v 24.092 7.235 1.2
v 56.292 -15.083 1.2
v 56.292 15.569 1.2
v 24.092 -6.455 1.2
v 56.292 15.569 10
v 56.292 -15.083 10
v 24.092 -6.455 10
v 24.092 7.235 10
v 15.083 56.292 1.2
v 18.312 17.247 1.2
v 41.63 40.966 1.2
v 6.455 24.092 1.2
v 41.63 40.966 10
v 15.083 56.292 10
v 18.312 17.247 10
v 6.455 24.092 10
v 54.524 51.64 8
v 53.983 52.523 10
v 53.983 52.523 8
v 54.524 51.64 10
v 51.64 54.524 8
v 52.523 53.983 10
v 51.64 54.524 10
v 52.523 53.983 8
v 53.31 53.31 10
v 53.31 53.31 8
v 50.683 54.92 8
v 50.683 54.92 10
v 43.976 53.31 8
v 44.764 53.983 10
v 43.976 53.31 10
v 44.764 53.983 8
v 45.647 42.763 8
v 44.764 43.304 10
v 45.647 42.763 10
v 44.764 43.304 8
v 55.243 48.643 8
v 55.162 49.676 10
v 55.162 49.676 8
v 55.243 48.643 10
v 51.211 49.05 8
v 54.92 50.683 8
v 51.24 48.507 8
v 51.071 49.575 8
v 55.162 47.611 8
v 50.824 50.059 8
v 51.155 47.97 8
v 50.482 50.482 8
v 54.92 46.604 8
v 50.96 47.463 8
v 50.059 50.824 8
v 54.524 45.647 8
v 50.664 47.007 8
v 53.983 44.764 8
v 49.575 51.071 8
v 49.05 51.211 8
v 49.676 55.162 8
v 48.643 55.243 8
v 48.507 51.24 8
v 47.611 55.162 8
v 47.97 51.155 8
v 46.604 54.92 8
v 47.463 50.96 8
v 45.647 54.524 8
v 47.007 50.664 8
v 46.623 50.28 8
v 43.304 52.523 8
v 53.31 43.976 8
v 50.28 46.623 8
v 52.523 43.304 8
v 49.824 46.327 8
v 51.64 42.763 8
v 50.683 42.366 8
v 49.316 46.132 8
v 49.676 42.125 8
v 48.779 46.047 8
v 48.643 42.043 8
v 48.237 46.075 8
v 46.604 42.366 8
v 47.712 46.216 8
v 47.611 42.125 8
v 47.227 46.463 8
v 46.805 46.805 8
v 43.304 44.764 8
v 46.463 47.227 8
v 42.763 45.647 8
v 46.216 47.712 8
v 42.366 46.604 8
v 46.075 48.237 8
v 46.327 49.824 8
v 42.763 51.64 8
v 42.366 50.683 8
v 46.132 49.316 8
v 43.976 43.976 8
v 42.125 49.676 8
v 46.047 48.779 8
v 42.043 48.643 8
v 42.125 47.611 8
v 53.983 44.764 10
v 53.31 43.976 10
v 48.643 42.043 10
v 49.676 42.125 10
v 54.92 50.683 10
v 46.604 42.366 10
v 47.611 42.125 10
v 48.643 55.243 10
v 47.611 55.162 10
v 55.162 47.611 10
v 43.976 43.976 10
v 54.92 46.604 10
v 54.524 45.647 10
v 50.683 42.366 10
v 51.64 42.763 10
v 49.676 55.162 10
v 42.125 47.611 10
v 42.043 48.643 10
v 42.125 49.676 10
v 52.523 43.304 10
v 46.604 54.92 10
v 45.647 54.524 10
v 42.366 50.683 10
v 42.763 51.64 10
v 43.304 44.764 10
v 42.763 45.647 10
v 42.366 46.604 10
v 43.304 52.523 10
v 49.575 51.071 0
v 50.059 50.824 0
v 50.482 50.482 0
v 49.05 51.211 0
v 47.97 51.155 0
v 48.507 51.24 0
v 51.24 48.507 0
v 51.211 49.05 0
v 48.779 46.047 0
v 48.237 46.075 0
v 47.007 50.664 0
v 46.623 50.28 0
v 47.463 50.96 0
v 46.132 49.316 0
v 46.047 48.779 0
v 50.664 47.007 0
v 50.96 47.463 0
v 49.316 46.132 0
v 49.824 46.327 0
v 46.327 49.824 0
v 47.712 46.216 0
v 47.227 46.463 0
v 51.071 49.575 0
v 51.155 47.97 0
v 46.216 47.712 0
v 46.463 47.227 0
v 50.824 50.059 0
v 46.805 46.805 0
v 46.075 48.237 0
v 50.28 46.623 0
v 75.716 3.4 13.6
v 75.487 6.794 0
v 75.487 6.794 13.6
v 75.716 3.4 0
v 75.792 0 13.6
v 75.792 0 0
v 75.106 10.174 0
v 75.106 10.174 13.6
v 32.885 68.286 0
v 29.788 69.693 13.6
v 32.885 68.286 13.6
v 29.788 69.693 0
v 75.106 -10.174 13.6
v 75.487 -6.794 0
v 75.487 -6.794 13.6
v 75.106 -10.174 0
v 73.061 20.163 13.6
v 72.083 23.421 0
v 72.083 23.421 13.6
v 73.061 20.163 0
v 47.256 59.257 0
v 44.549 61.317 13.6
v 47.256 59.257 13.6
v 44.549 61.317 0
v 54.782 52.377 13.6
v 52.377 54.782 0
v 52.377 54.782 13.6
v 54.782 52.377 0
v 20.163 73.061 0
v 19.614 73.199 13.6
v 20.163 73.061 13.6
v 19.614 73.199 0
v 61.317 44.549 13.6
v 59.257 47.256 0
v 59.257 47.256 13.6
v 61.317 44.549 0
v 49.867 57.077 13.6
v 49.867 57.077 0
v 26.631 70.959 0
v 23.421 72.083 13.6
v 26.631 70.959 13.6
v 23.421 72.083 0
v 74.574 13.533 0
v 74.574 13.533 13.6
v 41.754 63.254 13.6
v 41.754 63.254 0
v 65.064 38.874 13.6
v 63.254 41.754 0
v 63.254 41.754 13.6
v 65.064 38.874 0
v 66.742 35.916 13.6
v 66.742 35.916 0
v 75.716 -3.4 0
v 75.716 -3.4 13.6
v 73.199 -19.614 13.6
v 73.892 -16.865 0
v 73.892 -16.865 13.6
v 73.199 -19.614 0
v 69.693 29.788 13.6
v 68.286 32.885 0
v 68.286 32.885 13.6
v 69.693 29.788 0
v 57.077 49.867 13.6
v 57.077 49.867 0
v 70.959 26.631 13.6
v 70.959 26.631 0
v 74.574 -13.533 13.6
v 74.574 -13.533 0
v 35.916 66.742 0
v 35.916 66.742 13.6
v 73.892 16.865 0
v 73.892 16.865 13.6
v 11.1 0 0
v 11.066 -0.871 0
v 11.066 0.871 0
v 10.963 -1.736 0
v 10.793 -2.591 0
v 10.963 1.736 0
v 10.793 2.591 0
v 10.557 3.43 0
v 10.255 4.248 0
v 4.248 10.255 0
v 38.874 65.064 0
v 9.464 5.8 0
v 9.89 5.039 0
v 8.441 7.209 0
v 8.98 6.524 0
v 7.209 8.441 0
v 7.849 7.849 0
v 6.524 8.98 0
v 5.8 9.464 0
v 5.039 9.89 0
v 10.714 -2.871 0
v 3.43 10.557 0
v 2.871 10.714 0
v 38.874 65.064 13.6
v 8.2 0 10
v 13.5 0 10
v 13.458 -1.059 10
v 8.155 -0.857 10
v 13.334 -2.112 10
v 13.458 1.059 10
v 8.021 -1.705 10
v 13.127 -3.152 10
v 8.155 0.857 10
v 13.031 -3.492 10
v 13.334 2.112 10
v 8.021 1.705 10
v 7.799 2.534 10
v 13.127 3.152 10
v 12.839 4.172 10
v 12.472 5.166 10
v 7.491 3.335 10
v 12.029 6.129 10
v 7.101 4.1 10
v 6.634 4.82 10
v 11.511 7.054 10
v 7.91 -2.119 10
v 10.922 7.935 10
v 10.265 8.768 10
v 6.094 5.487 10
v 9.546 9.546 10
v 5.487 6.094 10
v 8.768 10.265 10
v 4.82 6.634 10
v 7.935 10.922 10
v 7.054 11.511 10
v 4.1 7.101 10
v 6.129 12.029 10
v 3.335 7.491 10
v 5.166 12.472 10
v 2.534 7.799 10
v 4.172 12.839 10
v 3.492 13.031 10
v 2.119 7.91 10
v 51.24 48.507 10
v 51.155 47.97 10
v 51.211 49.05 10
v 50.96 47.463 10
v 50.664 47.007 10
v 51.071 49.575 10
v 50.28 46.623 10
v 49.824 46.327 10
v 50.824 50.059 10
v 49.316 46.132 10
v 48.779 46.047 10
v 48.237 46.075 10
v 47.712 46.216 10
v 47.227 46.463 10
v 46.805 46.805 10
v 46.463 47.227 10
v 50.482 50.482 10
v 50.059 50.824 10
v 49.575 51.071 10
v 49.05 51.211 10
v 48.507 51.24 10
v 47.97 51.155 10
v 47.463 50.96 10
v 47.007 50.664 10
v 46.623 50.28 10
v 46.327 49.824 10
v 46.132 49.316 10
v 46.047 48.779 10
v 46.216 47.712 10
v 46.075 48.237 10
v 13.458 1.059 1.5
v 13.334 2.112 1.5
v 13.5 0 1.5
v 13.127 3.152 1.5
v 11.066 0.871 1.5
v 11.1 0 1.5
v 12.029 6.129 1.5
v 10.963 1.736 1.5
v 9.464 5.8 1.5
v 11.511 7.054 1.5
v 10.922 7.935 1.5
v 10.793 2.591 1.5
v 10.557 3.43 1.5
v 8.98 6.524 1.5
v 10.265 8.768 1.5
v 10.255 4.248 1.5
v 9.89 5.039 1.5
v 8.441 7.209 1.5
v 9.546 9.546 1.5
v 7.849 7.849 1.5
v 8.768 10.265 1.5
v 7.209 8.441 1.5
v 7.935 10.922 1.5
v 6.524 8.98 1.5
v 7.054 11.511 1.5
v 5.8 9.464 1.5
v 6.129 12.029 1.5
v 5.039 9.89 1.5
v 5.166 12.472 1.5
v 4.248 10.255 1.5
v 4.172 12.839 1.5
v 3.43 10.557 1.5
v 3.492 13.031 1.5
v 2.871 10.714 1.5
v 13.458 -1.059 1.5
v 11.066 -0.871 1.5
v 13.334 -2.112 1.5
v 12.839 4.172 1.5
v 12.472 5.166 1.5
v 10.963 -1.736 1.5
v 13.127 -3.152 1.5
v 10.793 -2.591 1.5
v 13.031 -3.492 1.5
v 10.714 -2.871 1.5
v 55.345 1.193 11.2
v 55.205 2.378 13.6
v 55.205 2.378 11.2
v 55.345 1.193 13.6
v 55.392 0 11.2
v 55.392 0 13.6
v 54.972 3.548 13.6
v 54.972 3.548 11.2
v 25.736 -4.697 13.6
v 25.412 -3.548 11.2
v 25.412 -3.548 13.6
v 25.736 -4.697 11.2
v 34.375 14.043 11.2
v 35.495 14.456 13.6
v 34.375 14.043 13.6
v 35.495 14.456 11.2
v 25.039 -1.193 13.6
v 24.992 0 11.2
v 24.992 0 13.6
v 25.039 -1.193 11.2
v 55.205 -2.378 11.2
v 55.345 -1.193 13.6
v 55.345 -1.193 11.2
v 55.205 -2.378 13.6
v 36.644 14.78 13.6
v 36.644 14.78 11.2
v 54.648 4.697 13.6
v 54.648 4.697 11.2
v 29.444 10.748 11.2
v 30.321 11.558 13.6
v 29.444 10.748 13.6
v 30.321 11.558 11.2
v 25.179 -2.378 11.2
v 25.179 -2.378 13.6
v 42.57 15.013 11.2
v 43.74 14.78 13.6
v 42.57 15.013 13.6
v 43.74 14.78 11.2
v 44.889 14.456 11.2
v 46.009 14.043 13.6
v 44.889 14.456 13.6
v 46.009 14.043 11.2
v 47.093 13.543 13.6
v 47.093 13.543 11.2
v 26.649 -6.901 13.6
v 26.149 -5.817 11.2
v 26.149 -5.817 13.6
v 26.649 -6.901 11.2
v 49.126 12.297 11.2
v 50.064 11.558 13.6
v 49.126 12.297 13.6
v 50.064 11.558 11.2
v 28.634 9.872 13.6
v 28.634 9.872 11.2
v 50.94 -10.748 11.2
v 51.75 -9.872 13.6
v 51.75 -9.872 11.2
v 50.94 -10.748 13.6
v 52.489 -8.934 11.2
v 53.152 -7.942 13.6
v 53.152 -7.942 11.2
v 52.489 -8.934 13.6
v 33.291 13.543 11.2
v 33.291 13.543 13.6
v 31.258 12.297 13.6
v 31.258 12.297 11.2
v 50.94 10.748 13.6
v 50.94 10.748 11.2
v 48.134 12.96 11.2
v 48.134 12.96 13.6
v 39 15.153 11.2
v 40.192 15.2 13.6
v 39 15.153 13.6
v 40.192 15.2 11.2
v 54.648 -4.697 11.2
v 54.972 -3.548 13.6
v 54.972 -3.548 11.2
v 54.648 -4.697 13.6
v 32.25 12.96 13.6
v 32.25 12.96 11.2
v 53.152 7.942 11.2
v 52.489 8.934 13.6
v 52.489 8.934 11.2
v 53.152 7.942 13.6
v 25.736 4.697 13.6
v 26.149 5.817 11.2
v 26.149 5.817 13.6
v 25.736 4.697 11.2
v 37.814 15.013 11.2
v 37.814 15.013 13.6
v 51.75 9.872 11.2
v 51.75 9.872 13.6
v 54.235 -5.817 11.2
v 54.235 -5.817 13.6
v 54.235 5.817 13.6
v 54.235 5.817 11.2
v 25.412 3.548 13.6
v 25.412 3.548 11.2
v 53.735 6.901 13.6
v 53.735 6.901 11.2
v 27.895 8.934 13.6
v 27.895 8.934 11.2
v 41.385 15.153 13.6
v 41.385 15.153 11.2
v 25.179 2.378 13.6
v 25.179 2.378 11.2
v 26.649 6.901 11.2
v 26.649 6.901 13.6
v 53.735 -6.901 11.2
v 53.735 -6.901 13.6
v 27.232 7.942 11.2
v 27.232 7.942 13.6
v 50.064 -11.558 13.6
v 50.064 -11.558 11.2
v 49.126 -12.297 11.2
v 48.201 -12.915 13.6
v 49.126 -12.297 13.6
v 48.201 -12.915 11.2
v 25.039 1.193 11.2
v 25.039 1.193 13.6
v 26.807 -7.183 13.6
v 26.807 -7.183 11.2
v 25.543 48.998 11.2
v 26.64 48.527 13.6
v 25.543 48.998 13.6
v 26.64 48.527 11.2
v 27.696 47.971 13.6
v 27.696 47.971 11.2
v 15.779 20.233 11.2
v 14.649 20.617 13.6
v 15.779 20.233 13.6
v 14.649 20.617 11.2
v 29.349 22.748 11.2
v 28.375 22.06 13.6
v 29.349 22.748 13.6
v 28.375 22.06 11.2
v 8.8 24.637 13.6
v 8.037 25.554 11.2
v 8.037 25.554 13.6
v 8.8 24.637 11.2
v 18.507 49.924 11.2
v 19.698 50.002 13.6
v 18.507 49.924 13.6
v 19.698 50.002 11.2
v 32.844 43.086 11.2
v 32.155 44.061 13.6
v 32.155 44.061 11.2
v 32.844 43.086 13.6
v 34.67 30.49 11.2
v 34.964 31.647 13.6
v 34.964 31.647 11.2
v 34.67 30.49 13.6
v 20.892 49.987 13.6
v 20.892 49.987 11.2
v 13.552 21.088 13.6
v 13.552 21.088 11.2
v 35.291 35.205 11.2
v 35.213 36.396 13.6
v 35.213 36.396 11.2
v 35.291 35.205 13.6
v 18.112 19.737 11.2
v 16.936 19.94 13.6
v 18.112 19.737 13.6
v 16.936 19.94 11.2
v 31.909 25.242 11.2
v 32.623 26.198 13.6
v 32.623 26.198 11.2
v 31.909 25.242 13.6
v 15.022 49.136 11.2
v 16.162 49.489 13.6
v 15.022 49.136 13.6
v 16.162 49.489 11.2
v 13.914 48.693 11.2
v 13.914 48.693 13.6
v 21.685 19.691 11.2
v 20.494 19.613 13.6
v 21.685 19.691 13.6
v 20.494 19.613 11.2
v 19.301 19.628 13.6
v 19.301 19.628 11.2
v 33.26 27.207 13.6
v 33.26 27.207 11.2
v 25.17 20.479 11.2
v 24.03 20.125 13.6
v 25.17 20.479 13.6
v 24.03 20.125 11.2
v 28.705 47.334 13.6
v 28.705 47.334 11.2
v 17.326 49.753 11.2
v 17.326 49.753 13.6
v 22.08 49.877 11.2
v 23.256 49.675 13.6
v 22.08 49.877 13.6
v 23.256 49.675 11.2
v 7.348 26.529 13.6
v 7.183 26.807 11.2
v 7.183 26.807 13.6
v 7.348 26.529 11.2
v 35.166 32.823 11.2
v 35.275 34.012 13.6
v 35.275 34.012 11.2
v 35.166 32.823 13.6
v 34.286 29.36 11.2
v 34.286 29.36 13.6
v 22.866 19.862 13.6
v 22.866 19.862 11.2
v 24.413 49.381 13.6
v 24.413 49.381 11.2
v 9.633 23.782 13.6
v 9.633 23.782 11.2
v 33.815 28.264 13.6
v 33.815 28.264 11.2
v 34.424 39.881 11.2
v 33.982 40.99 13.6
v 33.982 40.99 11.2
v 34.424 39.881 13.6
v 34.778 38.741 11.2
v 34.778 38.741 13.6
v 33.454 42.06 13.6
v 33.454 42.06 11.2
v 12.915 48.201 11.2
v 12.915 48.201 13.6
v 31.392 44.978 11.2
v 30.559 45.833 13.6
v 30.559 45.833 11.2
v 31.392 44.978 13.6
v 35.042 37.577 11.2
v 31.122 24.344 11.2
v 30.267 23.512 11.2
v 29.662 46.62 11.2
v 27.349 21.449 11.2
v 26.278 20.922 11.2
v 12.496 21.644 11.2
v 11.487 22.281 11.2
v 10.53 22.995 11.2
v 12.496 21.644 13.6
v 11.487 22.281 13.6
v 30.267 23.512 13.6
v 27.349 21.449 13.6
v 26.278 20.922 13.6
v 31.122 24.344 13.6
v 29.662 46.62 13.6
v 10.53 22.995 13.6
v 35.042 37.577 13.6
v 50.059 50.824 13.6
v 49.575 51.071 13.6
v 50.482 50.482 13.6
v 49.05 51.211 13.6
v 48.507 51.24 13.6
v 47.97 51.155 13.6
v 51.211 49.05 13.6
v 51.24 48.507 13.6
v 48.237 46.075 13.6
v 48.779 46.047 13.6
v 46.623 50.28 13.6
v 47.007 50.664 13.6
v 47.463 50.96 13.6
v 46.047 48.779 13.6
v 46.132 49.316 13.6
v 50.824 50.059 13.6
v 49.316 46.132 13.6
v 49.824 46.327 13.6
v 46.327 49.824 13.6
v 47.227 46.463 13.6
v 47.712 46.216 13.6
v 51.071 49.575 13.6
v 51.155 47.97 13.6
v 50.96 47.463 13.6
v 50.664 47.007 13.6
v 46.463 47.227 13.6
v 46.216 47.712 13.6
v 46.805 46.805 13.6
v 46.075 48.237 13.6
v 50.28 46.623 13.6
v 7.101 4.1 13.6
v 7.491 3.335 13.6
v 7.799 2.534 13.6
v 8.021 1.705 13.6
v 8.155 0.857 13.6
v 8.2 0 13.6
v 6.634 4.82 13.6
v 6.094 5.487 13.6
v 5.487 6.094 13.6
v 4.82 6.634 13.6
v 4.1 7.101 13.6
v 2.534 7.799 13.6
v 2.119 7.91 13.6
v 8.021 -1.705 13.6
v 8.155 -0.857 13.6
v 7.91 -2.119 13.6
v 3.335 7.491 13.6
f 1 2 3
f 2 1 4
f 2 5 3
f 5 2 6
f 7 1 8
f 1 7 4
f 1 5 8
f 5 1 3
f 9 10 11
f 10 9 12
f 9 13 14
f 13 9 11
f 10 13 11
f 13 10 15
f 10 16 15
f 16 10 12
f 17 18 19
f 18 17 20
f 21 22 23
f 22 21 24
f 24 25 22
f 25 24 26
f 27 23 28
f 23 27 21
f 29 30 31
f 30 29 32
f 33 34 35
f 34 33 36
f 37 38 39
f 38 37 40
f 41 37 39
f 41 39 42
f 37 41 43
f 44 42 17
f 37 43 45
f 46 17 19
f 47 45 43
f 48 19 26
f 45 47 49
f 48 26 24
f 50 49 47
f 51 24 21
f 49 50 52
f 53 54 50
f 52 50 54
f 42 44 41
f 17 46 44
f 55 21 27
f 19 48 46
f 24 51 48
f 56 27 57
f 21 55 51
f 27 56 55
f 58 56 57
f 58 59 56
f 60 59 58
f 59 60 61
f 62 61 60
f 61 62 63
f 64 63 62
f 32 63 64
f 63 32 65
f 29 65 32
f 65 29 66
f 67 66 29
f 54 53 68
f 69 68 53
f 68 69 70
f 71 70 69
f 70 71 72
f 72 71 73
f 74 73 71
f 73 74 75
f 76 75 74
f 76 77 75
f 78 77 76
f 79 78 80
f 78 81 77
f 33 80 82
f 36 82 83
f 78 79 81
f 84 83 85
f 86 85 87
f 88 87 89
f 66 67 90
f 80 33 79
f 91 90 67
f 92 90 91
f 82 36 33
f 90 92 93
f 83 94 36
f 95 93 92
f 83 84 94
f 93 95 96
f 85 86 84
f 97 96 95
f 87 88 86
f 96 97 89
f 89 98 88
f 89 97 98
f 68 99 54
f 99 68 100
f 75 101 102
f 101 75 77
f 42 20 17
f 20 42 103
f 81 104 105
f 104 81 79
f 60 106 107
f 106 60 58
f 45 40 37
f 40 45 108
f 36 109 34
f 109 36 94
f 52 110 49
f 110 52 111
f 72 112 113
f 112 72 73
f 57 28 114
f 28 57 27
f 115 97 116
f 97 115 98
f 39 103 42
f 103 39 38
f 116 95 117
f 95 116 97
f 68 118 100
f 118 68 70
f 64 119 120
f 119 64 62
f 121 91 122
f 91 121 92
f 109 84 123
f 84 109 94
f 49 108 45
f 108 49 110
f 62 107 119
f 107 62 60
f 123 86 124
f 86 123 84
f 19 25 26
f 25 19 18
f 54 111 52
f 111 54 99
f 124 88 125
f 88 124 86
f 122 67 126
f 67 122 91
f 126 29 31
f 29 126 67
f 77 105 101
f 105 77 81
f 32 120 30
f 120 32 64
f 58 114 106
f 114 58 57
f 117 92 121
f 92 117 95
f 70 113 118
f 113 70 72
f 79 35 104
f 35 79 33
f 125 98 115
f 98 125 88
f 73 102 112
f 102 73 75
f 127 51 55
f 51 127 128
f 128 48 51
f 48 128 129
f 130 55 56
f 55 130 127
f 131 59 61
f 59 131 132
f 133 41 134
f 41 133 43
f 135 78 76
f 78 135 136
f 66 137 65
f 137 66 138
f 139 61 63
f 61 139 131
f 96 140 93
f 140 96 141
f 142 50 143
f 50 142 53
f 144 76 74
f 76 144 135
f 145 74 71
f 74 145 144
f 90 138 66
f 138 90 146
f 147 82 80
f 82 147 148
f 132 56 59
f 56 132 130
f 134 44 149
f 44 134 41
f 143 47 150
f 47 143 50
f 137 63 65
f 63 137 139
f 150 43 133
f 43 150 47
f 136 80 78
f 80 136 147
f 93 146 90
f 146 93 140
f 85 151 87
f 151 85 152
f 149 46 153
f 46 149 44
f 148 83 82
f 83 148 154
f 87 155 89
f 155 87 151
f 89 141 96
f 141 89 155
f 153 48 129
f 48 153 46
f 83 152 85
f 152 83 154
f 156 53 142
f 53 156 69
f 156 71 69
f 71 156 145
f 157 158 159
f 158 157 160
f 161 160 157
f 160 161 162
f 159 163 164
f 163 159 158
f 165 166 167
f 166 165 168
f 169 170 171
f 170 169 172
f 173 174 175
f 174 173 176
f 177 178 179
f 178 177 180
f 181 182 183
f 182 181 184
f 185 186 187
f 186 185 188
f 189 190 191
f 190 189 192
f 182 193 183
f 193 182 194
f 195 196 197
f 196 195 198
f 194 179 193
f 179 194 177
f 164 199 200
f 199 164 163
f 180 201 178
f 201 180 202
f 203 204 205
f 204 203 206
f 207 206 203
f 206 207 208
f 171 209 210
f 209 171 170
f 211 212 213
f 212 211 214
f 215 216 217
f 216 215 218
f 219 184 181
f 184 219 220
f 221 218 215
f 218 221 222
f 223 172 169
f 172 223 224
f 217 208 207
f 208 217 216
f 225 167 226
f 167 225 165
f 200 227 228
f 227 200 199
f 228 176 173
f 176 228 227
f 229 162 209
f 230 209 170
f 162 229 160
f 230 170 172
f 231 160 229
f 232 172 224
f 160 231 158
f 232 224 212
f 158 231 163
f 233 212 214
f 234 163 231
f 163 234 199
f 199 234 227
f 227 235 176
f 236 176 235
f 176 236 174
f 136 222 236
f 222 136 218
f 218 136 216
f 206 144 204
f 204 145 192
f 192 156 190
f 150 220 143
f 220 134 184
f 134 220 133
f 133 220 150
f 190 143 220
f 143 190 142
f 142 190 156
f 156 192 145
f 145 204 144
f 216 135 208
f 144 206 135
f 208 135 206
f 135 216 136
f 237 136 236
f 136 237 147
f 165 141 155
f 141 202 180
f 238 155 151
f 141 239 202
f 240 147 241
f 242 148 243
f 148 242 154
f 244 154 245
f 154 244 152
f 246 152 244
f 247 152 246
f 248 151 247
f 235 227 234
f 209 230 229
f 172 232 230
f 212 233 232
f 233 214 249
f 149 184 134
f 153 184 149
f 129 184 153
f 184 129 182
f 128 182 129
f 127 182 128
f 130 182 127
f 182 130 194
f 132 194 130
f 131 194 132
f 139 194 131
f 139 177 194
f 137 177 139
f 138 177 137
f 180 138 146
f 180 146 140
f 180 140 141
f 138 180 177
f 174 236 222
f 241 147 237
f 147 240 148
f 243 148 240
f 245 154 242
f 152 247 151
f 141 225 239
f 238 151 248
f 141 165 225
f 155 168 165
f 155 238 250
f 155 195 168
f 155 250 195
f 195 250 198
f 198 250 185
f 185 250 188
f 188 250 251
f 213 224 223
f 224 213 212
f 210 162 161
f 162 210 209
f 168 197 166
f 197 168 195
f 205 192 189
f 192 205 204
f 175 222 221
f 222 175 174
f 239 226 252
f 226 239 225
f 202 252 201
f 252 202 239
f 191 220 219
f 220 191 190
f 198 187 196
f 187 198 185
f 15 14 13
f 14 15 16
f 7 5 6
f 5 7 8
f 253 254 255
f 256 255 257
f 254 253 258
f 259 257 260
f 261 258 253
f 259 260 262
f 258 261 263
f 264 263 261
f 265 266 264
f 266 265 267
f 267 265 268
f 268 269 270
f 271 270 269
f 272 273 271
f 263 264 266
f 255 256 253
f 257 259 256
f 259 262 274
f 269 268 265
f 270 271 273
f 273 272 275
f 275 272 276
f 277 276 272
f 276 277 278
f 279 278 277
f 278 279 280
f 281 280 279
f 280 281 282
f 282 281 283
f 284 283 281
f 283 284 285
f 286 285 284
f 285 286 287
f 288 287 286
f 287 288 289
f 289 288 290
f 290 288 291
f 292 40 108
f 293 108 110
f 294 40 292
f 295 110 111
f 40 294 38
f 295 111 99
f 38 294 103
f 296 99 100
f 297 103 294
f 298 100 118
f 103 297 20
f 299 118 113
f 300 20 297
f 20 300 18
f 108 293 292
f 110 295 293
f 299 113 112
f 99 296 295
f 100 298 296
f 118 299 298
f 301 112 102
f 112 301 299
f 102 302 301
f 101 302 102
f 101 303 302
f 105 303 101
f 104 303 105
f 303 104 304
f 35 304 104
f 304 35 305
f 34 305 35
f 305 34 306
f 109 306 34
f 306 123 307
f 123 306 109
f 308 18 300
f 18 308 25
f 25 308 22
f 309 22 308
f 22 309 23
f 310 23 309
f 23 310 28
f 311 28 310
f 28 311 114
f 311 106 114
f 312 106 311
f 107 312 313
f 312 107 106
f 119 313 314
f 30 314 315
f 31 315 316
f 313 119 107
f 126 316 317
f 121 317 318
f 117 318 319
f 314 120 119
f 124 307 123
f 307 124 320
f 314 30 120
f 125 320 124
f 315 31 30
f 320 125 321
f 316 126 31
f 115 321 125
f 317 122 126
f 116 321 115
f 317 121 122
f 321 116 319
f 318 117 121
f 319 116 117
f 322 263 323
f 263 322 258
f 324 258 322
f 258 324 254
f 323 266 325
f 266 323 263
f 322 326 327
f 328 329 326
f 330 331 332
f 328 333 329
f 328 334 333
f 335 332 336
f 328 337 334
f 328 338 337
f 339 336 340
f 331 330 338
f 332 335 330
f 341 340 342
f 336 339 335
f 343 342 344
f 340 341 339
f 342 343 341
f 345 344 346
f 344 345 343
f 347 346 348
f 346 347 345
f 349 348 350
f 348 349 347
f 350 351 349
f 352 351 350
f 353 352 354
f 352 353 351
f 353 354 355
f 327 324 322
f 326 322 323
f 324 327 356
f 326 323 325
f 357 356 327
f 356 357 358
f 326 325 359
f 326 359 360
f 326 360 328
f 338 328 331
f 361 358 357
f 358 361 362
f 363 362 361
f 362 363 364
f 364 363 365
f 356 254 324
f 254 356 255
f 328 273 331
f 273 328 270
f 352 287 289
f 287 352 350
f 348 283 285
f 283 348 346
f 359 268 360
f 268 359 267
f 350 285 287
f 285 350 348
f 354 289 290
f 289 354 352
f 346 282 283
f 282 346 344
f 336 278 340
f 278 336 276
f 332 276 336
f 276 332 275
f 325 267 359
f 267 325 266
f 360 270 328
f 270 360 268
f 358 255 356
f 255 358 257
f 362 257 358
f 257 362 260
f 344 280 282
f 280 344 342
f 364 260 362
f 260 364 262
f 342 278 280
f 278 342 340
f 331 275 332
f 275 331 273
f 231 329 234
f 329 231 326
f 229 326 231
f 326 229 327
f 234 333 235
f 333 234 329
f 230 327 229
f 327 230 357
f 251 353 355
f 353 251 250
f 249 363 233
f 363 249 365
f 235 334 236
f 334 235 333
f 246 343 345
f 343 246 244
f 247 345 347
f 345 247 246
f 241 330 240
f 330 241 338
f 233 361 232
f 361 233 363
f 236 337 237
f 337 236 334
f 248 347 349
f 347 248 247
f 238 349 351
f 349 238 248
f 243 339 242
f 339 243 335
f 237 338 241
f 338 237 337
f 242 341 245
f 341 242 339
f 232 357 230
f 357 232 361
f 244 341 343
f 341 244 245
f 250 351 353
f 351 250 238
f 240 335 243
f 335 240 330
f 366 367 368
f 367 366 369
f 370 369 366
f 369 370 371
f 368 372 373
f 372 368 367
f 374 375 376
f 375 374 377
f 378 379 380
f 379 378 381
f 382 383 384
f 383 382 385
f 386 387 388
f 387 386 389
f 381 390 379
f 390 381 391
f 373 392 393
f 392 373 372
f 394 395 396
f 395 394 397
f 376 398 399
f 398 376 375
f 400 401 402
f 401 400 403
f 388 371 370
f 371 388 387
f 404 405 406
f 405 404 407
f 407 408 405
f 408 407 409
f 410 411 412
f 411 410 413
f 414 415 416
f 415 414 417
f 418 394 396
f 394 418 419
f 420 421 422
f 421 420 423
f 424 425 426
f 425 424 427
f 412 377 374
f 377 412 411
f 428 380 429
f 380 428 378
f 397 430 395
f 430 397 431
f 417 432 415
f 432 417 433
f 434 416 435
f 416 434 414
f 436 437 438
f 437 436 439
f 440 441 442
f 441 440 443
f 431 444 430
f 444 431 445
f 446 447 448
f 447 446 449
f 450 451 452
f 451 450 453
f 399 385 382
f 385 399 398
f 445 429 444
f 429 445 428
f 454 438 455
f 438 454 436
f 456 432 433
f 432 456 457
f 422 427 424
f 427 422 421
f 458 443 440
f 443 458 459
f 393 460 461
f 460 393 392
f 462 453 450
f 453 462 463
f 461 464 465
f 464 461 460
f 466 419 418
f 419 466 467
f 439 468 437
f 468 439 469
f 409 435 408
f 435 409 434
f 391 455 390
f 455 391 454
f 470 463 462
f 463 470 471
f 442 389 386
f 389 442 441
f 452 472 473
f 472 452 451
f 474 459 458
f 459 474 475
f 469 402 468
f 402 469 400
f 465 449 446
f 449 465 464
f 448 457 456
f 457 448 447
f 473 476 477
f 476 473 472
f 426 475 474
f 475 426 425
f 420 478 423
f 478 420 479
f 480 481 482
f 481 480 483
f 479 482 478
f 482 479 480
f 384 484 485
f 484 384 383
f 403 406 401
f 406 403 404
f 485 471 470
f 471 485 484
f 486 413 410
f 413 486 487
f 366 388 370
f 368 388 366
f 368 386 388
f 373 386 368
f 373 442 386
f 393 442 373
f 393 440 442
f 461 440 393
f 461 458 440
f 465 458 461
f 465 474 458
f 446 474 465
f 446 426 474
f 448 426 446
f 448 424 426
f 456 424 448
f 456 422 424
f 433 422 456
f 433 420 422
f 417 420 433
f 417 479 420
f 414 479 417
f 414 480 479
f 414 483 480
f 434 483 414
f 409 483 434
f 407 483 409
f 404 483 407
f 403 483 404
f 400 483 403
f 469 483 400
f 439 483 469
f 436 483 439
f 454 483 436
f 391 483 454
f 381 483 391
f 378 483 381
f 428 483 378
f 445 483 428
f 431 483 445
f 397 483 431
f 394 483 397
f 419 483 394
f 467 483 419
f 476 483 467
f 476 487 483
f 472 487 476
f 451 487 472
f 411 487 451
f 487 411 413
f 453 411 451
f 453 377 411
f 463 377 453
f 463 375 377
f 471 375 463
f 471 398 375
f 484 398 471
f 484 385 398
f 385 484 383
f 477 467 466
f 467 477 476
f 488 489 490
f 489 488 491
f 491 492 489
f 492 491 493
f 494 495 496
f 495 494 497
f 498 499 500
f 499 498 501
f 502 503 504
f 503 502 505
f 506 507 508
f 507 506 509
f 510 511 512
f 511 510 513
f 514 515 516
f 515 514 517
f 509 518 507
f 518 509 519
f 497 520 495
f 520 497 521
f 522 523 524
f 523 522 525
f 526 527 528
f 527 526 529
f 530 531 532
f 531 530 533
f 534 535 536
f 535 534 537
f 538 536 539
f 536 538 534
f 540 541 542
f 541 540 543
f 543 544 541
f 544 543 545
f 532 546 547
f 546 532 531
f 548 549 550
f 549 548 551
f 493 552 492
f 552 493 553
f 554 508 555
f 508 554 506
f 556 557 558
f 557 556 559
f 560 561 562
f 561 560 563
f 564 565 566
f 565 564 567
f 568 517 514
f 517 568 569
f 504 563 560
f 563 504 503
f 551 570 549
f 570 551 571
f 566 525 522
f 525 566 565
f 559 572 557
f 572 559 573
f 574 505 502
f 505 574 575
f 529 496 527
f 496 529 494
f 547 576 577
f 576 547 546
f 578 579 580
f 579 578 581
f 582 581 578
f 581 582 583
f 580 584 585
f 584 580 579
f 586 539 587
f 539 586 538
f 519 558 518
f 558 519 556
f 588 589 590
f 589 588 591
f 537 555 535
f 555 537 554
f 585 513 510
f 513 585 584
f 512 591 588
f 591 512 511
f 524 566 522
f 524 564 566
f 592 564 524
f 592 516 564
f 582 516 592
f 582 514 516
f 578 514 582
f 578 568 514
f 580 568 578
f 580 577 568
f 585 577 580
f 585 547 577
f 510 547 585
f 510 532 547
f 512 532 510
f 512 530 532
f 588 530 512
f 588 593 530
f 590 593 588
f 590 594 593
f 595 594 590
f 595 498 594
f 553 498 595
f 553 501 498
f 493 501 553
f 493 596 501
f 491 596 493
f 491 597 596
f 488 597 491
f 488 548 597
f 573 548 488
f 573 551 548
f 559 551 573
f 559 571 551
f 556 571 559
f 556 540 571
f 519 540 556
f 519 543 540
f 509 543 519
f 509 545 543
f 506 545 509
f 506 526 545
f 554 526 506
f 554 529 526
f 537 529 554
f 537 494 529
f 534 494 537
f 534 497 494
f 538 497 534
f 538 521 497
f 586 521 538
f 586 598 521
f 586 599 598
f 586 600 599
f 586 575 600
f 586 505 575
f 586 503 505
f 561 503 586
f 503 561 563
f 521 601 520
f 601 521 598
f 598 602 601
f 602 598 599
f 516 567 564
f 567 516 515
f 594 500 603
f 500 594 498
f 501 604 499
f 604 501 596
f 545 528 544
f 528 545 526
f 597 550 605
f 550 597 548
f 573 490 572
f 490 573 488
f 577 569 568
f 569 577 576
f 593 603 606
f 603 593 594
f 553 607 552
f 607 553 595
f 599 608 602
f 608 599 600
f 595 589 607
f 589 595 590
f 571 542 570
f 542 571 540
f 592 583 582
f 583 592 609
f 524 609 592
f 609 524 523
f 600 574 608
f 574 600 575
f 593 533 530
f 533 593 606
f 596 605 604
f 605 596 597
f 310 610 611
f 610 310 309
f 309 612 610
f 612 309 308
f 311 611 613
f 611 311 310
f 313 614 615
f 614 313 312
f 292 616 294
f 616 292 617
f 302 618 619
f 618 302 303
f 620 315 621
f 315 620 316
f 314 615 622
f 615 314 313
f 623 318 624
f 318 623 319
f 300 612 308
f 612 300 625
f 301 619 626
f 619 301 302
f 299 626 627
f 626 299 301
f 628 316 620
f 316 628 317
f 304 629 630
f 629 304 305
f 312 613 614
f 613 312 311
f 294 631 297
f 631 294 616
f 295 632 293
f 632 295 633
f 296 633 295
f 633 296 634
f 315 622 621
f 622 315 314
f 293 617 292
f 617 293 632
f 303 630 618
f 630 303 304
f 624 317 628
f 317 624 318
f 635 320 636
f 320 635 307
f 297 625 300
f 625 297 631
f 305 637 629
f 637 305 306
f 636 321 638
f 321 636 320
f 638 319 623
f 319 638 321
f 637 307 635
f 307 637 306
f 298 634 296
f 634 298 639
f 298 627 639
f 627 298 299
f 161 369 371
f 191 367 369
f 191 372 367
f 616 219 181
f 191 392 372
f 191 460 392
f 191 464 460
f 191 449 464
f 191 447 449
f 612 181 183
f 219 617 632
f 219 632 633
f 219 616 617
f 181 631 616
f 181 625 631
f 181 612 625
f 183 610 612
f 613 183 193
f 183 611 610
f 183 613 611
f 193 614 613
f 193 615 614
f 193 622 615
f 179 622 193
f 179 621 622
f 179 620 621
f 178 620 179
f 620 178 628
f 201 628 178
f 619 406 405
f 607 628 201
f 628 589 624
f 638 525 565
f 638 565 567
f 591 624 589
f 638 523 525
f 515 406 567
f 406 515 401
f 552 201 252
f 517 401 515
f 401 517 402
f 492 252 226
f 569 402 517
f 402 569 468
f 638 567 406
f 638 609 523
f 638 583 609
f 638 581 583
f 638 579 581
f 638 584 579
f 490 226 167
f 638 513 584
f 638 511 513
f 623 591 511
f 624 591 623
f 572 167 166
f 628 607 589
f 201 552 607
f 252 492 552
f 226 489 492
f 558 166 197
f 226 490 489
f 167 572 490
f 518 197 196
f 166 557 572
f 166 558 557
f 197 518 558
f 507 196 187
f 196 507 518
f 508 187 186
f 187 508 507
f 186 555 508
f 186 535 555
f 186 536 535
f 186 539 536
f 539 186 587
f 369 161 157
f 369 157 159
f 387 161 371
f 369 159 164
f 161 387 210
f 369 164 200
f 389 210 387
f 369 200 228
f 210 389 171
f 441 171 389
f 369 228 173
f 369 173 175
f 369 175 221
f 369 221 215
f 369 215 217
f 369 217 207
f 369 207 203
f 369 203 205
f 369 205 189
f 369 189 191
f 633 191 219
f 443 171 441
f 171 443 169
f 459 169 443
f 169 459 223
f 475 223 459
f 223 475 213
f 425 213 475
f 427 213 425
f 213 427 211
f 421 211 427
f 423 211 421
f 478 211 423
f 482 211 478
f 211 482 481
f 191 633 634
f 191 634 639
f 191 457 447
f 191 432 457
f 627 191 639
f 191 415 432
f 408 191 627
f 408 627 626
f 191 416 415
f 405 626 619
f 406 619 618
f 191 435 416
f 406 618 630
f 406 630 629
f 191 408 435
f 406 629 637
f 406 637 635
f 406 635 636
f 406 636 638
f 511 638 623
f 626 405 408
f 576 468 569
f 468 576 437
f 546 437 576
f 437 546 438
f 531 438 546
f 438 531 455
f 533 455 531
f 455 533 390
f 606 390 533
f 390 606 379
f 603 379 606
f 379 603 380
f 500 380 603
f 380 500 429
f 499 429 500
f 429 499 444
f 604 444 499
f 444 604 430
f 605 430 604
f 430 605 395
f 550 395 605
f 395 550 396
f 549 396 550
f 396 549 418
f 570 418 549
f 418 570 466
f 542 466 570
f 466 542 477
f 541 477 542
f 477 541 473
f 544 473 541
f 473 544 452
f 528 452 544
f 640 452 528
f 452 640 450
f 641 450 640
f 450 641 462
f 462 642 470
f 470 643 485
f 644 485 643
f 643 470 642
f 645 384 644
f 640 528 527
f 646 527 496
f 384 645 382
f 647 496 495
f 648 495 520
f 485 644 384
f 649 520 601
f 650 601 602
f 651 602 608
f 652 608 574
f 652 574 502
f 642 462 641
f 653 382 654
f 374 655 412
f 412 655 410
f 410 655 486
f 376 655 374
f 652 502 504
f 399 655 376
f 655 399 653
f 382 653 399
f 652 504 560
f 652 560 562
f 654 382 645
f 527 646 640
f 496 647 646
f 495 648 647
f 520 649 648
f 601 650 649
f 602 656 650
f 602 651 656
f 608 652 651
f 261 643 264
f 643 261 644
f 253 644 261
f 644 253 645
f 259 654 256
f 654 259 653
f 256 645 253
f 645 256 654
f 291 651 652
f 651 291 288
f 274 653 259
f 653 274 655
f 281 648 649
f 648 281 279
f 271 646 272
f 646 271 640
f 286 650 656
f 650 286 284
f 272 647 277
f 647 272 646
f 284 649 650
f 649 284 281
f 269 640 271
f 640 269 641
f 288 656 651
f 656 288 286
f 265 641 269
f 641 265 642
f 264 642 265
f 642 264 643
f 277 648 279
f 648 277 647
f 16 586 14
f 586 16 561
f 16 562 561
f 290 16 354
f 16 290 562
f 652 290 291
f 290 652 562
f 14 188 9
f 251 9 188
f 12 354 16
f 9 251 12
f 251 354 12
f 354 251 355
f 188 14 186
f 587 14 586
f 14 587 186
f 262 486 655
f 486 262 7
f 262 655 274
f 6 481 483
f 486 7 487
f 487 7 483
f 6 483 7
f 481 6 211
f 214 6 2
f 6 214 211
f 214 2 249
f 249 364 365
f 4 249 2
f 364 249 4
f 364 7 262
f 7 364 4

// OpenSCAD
/* 
   GEN 11 v5.6: THE INTEGRATED TRIPLE-CHECK MASTER
   - COMPONENTS: Hex-Lock Rotor, Bearing-Ready Stators, Flux-Return Plates, Spacers, Winder.
   - VERIFICATION: Added "verify_alignment" mode to see Coil-to-Washer overlap.
   - LOCKING: Central 13.5mm Hex-Nut Trap for M8 Rod.
   - TOLERANCE: Unified magnet_center_r across all parts for modular alignment.
*/

// ==========================================
// 1. MASTER PARAMETERS (USER TUNABLES)
// ==========================================
num_magnets = 12;           
num_coils   = 6;            
bar_mag_length = 29.2;      
bar_mag_width  = 9.4;        
bar_mag_depth  = 6.0;        

// --- GAP & FLUX ---
air_gap = 1.25;             
coil_thickness = 7.8;       
thin_floor = 1.2;           
washer_flux_depth = 2.4;    
washer_flux_r = 15.2;       
flux_plate_floor = 1.2;     

// --- AXLE & BEARING (608 Standard) ---
axel_r = 4.2;               
nut_hex_dist = 13.5;        
bearing_od = 22.2;          
bearing_h = 7.1;            
alignment_bolt_r = 2.6;     
spacer_inset_depth = 2.0;   

// --- DYNAMIC CALCULATIONS ---
magnet_gap_buffer = 4.0;
min_circ = num_magnets * (bar_mag_width + magnet_gap_buffer);
magnet_center_r = (min_circ / (2 * PI)) + (bar_mag_length / 2);
rotor_total_h = 10.0;       
rotor_r = magnet_center_r + (bar_mag_length / 2) + 6;
stator_r = rotor_r + 15;    
mount_r = rotor_r + 8; 
stator_h = 10.0;            

// ==========================================
// 2. VIEW MODES (Choose One)
// ==========================================
show_print_layout   = false;
show_full_assembly  = false;
verify_alignment    = true; // Set to TRUE to see the "X-Ray" alignment check

if (verify_alignment) {
    check_flux_alignment();
} else if (show_full_assembly) {
    renderFullAssembly();
} else {
    // Standard Print Layout
    layout_gap = stator_r * 2.2;
    translate([0, 0, 0]) bar_rotor();
    translate([layout_gap, 0, 0]) bar_stator();
    translate([layout_gap * 1.5, layout_gap, 0]) flux_plate();
    translate([layout_gap, layout_gap * 0.8, 0]) spacer_set();
    translate([0, -layout_gap * 0.8, 0]) bar_winder_set();
}

// ==========================================
// 3. ASSEMBLY & VERIFICATION LOGIC
// ==========================================

module renderFullAssembly() {
    arm_dist = (rotor_total_h/2) + air_gap; 
    color("Silver") cylinder(h=120, r=axel_r, center=true, $fn=40);
    color("Gold", 0.8) bar_rotor();
    color("DimGray") {
        translate([0,0, rotor_total_h/2 - 2]) rotate([0,0,30]) m8_nut();
        translate([0,0, -rotor_total_h/2 + 2]) rotate([0,0,0]) m8_nut();
    }
    translate([0, 0, arm_dist + stator_h]) rotate([180, 0, 0]) {
        color("RoyalBlue", 0.5) bar_stator();
        translate([0,0,-0.5]) color("LightGrey") 608_bearing();
    }
    translate([0, 0, -arm_dist - stator_h]) rotate([0, 0, 0]) {
        color("RoyalBlue", 0.5) bar_stator();
        translate([0,0,-0.5]) color("LightGrey") 608_bearing();
    }
    flux_h = washer_flux_depth + flux_plate_floor;
    translate([0,0, arm_dist + stator_h]) color("CadetBlue", 0.6) flux_plate();
    translate([0,0, -arm_dist - stator_h - flux_h]) color("CadetBlue", 0.6) flux_plate();
    spacer_h = (rotor_total_h + (2 * air_gap)) + (2 * spacer_inset_depth);
    for(i=[0:3]) rotate([0,0,i*90+45]) translate([mount_r, 0, 0]) {
        translate([0,0, -spacer_h/2]) color("Orange") stator_spacer();
        color("Silver") cylinder(h=100, r=alignment_bolt_r, center=true, $fn=20);
    }
}

module check_flux_alignment() {
    // This "X-Rays" the side-profile of one coil/washer set
    intersection() {
        union() {
            color("RoyalBlue", 0.4) bar_stator();
            color("DimGray", 0.8) translate([0,0, stator_h]) flux_plate();
        }
        // Slice a 30-degree wedge
        rotate([0,0,-15]) cube([150, 150, 50]);
    }
}

// ==========================================
// 4. CORE COMPONENT MODULES
// ==========================================

module bar_rotor() {
    difference() {
        cylinder(h=rotor_total_h, r=rotor_r, center=true, $fn=120);
        for (i = [0:num_magnets-1]) {
            rotate([0, 0, i * (360/num_magnets)])
                translate([magnet_center_r, 0, 0]) 
                cube([bar_mag_length + 0.4, bar_mag_width + 0.4, 25], center=true);
        }
        cylinder(h=rotor_total_h + 2, r=nut_hex_dist/2 / cos(30), center=true, $fn=6);
    }
}

module bar_stator() {
    difference() {
        cylinder(h=stator_h, r=stator_r, $fn=140);
        for(i = [0 : num_coils - 1]) {
            rotate([0, 0, i * (360/num_coils)])
            translate([magnet_center_r, 0, thin_floor]) 
                trap_shape(h=20, extra_l=3, extra_w=2);
        }
        translate([0, 0, 1.5]) cylinder(h=stator_h, r=13.5, $fn=80); 
        translate([0, 0, -1]) cylinder(h=bearing_h + 1, r=bearing_od/2, $fn=80);
        translate([0,0,-1]) cylinder(h=20, r=axel_r + 0.5, $fn=60);
        for(i = [0:3]) {
            rotate([0, 0, i * 90 + 45]) translate([mount_r, 0, stator_h - spacer_inset_depth])
                cylinder(h=spacer_inset_depth + 1, r=6.6, $fn=40);
            rotate([0, 0, i * 90 + 45]) translate([mount_r, 0, -5]) 
                cylinder(h=stator_h + 15, r=alignment_bolt_r, $fn=30);
        }
    }
}

module flux_plate() {
    h_plate = washer_flux_depth + flux_plate_floor;
    difference() {
        cylinder(h=h_plate, r=stator_r, $fn=140);
        for(i = [0 : num_coils - 1]) {
            rotate([0, 0, i * (360/num_coils)])
            translate([magnet_center_r, 0, flux_plate_floor]) 
                cylinder(h=10, r=washer_flux_r, $fn=80);
        }
        for(i = [0:3]) {
            rotate([0, 0, i * 90 + 45]) translate([mount_r, 0, -1]) 
                cylinder(h=20, r=alignment_bolt_r, $fn=30);
        }
        translate([0,0,-1]) cylinder(h=20, r=axel_r + 4, $fn=60);
    }
}

module stator_spacer() {
    h_spacer = (rotor_total_h + (2 * air_gap)) + (2 * spacer_inset_depth);
    difference() {
        cylinder(h=h_spacer, r=6.5, $fn=50);
        translate([0,0,-1]) cylinder(h=h_spacer+2, r=alignment_bolt_r, $fn=30);
    }
}

// ==========================================
// 5. TOOLING & HELPERS
// ==========================================

module bar_winder_set() {
    spacing = bar_mag_length + 40;
    translate([-spacing/2, 0, 0]) winder_bottom();
    translate([spacing/2, 0, 0]) winder_top();
}

module winder_bottom() {
    f_h = 6.0; core_h = coil_thickness + 3.0; 
    difference() {
        union() {
            trap_shape(h=f_h, extra_l=10, extra_w=8); 
            translate([0,0, f_h]) trap_shape(h=core_h, extra_l=-0.5, extra_w=-1);
        }
        translate([0,0,-1]) cylinder(h=50, r=alignment_bolt_r, $fn=40);
        translate([0, 0, f_h/2]) cube([bar_mag_length*5, 1.4, f_h+0.2], center=true);
    }
}

module winder_top() {
    f_h = 6.0;
    difference() {
        trap_shape(h=f_h, extra_l=10, extra_w=8);
        translate([0, 0, f_h - 3.0]) scale([1.1, 1.1, 1]) trap_shape(h=4, extra_l=-0.5, extra_w=-1);
        translate([0,0,-1]) cylinder(h=50, r=alignment_bolt_r, $fn=40);
    }
}

module trap_shape(h, extra_l=0, extra_w=0) {
    pitch = 30; l = bar_mag_length + extra_l;
    r_in = magnet_center_r - l/2; r_out = magnet_center_r + l/2;
    wi = (2 * r_in * sin(pitch/2)) + extra_w;
    wo = (2 * r_out * sin(pitch/2)) + extra_w;
    translate([-l/2, 0, 0]) linear_extrude(h) polygon([[0, -wi/2], [0, wi/2], [l, wo / 2], [l, -wo / 2]]);
}

module m8_nut() {
    difference() {
        cylinder(h=6.5, r=nut_hex_dist/2 / cos(30), center=true, $fn=6);
        cylinder(h=10, r=axel_r, center=true, $fn=30);
    }
}

module 608_bearing() {
    difference() {
        cylinder(h=7, r=22/2, center=false, $fn=60); 
        translate([0,0,-1]) cylinder(h=9, r=8/2, center=false, $fn=40);
        translate([0,0,1]) difference() {
            cylinder(h=5, r=20/2, $fn=60);
            cylinder(h=6, r=10/2, $fn=60);
        }
    }
}
